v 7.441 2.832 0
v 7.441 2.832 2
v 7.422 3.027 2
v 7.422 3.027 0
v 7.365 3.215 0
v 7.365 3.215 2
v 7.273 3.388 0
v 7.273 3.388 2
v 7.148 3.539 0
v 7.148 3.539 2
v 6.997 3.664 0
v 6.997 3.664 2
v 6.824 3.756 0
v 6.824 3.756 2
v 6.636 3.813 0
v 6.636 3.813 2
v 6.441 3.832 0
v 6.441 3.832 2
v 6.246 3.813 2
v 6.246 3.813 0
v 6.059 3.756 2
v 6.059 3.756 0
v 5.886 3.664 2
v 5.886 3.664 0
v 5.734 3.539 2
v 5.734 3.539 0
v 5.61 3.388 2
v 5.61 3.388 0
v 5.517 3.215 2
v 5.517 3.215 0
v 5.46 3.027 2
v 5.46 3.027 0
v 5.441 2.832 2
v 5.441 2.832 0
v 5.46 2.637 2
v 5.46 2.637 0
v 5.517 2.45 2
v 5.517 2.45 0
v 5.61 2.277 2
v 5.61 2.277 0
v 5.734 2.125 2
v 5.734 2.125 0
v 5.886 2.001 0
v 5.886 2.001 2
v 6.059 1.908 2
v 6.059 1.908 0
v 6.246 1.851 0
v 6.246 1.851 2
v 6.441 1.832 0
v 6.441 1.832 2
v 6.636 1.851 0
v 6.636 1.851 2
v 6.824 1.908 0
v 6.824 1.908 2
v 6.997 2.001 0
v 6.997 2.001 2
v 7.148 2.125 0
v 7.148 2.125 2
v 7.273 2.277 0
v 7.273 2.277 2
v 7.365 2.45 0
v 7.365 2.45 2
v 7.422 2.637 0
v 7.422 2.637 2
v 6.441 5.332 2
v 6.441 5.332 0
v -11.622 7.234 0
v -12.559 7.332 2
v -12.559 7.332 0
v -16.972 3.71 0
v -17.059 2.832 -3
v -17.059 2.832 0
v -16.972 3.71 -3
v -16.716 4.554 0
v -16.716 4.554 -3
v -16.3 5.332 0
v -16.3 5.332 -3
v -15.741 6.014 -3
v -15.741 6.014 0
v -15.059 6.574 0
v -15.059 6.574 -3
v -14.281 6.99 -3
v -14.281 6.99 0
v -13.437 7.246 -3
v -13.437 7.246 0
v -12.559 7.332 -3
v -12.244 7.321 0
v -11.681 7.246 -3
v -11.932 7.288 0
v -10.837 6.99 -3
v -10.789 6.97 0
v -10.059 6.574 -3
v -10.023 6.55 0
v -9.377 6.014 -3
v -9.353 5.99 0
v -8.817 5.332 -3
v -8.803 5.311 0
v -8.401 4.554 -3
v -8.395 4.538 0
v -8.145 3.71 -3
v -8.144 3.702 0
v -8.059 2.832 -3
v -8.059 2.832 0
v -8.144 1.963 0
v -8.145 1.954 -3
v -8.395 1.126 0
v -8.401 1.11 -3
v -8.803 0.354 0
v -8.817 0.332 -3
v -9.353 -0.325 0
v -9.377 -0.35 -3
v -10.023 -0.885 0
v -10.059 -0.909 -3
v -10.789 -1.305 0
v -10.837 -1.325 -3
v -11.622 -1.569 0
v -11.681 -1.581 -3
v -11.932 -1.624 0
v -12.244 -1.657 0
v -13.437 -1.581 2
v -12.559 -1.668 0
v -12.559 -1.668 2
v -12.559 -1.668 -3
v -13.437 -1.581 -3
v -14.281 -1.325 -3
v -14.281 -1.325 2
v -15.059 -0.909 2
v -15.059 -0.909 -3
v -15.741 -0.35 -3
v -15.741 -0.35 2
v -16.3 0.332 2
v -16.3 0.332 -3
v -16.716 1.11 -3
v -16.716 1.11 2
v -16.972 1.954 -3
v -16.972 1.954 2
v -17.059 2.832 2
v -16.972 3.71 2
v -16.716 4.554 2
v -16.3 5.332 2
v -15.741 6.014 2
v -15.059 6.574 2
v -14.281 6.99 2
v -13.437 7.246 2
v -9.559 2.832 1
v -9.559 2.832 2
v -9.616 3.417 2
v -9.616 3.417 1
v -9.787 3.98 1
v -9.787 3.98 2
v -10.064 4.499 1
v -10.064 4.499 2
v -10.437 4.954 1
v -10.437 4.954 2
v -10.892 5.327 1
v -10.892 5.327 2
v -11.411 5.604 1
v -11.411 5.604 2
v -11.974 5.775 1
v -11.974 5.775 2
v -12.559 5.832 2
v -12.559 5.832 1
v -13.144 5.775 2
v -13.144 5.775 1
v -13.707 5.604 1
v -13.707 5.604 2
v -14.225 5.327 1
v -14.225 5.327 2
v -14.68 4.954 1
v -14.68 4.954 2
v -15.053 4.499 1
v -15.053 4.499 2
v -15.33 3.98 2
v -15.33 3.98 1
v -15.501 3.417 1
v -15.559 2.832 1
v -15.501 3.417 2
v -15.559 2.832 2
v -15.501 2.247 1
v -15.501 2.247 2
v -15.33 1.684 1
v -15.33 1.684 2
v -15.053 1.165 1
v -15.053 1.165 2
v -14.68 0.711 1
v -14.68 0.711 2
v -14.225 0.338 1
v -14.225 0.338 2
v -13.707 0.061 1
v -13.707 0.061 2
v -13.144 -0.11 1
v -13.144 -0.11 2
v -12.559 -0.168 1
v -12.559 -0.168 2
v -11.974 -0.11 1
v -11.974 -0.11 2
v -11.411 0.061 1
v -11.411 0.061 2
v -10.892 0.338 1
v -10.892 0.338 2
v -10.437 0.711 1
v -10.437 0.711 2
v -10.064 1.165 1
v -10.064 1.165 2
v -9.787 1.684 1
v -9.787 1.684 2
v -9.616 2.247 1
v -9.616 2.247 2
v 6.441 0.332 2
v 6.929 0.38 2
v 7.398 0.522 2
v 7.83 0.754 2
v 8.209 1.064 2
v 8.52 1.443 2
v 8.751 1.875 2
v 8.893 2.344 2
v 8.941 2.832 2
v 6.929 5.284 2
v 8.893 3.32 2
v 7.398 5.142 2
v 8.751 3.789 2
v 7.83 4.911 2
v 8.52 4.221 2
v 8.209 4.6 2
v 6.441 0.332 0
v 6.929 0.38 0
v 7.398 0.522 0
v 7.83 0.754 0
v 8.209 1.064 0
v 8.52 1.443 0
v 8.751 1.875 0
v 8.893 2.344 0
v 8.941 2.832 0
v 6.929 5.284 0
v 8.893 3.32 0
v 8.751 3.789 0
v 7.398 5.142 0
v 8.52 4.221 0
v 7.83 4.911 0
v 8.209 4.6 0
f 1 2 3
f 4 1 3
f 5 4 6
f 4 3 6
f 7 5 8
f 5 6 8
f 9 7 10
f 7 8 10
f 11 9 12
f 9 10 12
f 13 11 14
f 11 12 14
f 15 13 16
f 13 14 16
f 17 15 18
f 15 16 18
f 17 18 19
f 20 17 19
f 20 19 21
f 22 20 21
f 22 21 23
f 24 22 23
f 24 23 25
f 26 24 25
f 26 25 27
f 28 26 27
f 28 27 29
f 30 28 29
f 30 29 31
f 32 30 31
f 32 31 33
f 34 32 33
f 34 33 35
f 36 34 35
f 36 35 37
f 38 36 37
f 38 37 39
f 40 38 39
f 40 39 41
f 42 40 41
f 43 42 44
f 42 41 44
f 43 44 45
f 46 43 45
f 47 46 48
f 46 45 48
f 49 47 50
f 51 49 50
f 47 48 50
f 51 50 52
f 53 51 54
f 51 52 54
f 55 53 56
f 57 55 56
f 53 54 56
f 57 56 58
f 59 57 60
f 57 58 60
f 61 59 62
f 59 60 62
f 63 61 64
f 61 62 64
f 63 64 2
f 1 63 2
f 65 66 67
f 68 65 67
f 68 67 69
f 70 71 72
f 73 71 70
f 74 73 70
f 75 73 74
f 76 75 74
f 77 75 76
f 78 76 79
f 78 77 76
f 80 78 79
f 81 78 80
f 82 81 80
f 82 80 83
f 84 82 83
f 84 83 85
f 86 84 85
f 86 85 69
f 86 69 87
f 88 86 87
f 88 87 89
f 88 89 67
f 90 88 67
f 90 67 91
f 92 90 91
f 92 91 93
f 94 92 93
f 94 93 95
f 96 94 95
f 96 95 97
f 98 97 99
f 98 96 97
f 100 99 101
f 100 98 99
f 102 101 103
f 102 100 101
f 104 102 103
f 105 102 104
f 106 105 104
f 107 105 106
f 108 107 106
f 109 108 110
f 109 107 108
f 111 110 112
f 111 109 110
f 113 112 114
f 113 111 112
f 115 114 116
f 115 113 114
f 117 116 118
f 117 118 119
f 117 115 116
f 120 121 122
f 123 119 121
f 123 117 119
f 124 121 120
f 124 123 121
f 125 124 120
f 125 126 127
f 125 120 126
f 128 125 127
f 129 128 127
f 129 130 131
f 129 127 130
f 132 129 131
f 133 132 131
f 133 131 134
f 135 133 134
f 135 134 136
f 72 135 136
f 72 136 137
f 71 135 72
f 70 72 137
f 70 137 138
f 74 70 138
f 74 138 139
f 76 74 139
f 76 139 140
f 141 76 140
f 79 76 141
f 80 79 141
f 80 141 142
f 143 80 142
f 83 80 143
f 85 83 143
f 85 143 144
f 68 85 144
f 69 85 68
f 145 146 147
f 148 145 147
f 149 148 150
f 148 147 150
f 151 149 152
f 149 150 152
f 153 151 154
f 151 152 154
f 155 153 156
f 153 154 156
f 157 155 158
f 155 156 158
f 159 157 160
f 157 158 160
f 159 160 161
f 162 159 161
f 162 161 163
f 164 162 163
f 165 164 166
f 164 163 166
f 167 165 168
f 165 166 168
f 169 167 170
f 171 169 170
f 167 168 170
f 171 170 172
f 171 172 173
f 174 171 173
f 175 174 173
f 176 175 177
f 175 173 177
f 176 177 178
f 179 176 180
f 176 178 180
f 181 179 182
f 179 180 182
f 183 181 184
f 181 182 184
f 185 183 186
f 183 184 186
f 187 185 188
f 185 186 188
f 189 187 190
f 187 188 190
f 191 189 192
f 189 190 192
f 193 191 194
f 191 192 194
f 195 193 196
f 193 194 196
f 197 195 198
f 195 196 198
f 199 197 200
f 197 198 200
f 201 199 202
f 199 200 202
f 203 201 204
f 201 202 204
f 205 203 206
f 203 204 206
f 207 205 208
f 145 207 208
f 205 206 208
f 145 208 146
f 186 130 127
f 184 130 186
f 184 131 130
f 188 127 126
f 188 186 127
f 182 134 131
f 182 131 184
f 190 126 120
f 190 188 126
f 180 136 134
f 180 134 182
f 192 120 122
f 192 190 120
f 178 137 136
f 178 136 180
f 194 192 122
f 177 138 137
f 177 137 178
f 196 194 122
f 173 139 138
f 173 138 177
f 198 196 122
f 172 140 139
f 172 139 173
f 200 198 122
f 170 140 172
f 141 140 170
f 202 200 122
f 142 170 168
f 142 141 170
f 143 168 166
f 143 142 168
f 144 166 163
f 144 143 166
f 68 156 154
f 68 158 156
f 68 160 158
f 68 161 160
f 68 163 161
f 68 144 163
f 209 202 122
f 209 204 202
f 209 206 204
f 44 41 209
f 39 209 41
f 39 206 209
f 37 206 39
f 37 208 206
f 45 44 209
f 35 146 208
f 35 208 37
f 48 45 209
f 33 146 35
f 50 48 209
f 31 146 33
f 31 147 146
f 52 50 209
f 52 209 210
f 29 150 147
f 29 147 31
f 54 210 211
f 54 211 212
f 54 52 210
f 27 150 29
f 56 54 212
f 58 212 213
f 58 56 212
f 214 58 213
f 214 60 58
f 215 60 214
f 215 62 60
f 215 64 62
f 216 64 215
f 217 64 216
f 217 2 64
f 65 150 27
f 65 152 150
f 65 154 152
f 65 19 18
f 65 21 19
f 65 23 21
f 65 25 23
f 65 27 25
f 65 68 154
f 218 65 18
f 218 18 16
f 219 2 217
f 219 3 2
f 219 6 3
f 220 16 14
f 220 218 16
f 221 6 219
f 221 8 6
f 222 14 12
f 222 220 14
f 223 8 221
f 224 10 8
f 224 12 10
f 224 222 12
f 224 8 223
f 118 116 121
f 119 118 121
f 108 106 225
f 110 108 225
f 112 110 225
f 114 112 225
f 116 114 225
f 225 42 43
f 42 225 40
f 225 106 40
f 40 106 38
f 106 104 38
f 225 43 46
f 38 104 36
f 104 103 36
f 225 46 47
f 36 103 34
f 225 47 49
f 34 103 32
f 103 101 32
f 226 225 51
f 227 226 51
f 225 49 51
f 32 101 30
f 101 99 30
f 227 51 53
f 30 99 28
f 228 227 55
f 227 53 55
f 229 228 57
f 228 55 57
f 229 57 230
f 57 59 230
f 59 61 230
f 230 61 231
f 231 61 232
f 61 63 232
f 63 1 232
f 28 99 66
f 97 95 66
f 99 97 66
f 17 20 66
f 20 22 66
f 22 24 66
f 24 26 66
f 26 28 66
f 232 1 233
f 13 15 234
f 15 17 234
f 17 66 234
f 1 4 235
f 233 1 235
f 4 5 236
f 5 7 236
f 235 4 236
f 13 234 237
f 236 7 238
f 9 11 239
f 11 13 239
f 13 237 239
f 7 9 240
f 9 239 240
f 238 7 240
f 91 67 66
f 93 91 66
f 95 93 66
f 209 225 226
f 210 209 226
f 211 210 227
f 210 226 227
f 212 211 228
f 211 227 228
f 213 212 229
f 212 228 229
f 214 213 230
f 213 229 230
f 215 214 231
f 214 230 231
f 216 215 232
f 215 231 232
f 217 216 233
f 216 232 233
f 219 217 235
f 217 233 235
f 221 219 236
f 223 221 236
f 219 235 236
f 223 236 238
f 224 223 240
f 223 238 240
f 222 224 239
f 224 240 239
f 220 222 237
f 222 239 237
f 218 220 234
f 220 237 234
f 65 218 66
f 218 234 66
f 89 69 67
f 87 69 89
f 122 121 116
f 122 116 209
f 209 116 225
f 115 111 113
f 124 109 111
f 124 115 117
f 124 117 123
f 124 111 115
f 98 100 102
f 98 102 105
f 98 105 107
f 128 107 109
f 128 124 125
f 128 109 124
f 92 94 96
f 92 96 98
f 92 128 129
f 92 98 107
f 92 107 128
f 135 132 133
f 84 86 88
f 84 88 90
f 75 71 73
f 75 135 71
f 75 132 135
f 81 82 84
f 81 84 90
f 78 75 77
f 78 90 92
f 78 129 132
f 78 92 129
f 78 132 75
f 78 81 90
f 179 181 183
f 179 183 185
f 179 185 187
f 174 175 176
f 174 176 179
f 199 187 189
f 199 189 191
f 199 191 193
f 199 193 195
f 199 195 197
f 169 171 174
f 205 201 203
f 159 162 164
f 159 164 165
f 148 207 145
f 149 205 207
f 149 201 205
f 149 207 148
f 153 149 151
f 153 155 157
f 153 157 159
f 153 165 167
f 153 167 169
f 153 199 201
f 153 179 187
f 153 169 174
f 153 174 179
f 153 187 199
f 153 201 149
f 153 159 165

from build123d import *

# Parameters (mm, degrees)
BOSS_EXTRUDE1_DEPTH = 2
SKETCH3_R           = 1
CUT_EXTRUDE1_DEPTH  = 3
BOSS_EXTRUDE3_START = 3
SKETCH4_R           = 4.5
BOSS_EXTRUDE3_DEPTH = 3
SKETCH5_R           = 3
CUT_EXTRUDE2_DEPTH  = 1


with BuildPart() as part:
    # Sketch1 → Boss-Extrude1 (new body)
    with BuildSketch(Plane.XY):
        with BuildLine():
            Line((6.441226576, 5.332197615), (-12.558773424, 7.332197615))
            ThreePointArc((-12.558773424, 7.332197615), (-17.058773424, 2.832197615), (-12.558773424, -1.667802385))
            Line((-12.558773424, -1.667802385), (6.441226576, 0.332197615))
            ThreePointArc((6.441226576, 0.332197615), (8.941226576, 2.832197615), (6.441226576, 5.332197615))
        make_face()
    extrude(amount=BOSS_EXTRUDE1_DEPTH)

    # Sketch3 → Cut-Extrude1 (cut)
    with BuildSketch(Plane.XY.offset(2)):
        with Locations((6.441226576, 2.832197615)):
            Circle(SKETCH3_R)
    extrude(amount=-CUT_EXTRUDE1_DEPTH, mode=Mode.SUBTRACT)

    # Sketch4 → Boss-Extrude3 (add)
    with BuildSketch(Plane(origin=(0, 0, 0), x_dir=(-1, 0, 0), z_dir=(0, 0, -1)).offset(BOSS_EXTRUDE3_START)):
        with Locations((12.558773424, 2.832197615)):
            Circle(SKETCH4_R)
    extrude(amount=-BOSS_EXTRUDE3_DEPTH)

    # Sketch5 → Cut-Extrude2 (cut)
    with BuildSketch(Plane.XY.offset(2)):
        with Locations((-12.558773424, 2.832197615)):
            Circle(SKETCH5_R)
    extrude(amount=-CUT_EXTRUDE2_DEPTH, mode=Mode.SUBTRACT)


solid = part.part
